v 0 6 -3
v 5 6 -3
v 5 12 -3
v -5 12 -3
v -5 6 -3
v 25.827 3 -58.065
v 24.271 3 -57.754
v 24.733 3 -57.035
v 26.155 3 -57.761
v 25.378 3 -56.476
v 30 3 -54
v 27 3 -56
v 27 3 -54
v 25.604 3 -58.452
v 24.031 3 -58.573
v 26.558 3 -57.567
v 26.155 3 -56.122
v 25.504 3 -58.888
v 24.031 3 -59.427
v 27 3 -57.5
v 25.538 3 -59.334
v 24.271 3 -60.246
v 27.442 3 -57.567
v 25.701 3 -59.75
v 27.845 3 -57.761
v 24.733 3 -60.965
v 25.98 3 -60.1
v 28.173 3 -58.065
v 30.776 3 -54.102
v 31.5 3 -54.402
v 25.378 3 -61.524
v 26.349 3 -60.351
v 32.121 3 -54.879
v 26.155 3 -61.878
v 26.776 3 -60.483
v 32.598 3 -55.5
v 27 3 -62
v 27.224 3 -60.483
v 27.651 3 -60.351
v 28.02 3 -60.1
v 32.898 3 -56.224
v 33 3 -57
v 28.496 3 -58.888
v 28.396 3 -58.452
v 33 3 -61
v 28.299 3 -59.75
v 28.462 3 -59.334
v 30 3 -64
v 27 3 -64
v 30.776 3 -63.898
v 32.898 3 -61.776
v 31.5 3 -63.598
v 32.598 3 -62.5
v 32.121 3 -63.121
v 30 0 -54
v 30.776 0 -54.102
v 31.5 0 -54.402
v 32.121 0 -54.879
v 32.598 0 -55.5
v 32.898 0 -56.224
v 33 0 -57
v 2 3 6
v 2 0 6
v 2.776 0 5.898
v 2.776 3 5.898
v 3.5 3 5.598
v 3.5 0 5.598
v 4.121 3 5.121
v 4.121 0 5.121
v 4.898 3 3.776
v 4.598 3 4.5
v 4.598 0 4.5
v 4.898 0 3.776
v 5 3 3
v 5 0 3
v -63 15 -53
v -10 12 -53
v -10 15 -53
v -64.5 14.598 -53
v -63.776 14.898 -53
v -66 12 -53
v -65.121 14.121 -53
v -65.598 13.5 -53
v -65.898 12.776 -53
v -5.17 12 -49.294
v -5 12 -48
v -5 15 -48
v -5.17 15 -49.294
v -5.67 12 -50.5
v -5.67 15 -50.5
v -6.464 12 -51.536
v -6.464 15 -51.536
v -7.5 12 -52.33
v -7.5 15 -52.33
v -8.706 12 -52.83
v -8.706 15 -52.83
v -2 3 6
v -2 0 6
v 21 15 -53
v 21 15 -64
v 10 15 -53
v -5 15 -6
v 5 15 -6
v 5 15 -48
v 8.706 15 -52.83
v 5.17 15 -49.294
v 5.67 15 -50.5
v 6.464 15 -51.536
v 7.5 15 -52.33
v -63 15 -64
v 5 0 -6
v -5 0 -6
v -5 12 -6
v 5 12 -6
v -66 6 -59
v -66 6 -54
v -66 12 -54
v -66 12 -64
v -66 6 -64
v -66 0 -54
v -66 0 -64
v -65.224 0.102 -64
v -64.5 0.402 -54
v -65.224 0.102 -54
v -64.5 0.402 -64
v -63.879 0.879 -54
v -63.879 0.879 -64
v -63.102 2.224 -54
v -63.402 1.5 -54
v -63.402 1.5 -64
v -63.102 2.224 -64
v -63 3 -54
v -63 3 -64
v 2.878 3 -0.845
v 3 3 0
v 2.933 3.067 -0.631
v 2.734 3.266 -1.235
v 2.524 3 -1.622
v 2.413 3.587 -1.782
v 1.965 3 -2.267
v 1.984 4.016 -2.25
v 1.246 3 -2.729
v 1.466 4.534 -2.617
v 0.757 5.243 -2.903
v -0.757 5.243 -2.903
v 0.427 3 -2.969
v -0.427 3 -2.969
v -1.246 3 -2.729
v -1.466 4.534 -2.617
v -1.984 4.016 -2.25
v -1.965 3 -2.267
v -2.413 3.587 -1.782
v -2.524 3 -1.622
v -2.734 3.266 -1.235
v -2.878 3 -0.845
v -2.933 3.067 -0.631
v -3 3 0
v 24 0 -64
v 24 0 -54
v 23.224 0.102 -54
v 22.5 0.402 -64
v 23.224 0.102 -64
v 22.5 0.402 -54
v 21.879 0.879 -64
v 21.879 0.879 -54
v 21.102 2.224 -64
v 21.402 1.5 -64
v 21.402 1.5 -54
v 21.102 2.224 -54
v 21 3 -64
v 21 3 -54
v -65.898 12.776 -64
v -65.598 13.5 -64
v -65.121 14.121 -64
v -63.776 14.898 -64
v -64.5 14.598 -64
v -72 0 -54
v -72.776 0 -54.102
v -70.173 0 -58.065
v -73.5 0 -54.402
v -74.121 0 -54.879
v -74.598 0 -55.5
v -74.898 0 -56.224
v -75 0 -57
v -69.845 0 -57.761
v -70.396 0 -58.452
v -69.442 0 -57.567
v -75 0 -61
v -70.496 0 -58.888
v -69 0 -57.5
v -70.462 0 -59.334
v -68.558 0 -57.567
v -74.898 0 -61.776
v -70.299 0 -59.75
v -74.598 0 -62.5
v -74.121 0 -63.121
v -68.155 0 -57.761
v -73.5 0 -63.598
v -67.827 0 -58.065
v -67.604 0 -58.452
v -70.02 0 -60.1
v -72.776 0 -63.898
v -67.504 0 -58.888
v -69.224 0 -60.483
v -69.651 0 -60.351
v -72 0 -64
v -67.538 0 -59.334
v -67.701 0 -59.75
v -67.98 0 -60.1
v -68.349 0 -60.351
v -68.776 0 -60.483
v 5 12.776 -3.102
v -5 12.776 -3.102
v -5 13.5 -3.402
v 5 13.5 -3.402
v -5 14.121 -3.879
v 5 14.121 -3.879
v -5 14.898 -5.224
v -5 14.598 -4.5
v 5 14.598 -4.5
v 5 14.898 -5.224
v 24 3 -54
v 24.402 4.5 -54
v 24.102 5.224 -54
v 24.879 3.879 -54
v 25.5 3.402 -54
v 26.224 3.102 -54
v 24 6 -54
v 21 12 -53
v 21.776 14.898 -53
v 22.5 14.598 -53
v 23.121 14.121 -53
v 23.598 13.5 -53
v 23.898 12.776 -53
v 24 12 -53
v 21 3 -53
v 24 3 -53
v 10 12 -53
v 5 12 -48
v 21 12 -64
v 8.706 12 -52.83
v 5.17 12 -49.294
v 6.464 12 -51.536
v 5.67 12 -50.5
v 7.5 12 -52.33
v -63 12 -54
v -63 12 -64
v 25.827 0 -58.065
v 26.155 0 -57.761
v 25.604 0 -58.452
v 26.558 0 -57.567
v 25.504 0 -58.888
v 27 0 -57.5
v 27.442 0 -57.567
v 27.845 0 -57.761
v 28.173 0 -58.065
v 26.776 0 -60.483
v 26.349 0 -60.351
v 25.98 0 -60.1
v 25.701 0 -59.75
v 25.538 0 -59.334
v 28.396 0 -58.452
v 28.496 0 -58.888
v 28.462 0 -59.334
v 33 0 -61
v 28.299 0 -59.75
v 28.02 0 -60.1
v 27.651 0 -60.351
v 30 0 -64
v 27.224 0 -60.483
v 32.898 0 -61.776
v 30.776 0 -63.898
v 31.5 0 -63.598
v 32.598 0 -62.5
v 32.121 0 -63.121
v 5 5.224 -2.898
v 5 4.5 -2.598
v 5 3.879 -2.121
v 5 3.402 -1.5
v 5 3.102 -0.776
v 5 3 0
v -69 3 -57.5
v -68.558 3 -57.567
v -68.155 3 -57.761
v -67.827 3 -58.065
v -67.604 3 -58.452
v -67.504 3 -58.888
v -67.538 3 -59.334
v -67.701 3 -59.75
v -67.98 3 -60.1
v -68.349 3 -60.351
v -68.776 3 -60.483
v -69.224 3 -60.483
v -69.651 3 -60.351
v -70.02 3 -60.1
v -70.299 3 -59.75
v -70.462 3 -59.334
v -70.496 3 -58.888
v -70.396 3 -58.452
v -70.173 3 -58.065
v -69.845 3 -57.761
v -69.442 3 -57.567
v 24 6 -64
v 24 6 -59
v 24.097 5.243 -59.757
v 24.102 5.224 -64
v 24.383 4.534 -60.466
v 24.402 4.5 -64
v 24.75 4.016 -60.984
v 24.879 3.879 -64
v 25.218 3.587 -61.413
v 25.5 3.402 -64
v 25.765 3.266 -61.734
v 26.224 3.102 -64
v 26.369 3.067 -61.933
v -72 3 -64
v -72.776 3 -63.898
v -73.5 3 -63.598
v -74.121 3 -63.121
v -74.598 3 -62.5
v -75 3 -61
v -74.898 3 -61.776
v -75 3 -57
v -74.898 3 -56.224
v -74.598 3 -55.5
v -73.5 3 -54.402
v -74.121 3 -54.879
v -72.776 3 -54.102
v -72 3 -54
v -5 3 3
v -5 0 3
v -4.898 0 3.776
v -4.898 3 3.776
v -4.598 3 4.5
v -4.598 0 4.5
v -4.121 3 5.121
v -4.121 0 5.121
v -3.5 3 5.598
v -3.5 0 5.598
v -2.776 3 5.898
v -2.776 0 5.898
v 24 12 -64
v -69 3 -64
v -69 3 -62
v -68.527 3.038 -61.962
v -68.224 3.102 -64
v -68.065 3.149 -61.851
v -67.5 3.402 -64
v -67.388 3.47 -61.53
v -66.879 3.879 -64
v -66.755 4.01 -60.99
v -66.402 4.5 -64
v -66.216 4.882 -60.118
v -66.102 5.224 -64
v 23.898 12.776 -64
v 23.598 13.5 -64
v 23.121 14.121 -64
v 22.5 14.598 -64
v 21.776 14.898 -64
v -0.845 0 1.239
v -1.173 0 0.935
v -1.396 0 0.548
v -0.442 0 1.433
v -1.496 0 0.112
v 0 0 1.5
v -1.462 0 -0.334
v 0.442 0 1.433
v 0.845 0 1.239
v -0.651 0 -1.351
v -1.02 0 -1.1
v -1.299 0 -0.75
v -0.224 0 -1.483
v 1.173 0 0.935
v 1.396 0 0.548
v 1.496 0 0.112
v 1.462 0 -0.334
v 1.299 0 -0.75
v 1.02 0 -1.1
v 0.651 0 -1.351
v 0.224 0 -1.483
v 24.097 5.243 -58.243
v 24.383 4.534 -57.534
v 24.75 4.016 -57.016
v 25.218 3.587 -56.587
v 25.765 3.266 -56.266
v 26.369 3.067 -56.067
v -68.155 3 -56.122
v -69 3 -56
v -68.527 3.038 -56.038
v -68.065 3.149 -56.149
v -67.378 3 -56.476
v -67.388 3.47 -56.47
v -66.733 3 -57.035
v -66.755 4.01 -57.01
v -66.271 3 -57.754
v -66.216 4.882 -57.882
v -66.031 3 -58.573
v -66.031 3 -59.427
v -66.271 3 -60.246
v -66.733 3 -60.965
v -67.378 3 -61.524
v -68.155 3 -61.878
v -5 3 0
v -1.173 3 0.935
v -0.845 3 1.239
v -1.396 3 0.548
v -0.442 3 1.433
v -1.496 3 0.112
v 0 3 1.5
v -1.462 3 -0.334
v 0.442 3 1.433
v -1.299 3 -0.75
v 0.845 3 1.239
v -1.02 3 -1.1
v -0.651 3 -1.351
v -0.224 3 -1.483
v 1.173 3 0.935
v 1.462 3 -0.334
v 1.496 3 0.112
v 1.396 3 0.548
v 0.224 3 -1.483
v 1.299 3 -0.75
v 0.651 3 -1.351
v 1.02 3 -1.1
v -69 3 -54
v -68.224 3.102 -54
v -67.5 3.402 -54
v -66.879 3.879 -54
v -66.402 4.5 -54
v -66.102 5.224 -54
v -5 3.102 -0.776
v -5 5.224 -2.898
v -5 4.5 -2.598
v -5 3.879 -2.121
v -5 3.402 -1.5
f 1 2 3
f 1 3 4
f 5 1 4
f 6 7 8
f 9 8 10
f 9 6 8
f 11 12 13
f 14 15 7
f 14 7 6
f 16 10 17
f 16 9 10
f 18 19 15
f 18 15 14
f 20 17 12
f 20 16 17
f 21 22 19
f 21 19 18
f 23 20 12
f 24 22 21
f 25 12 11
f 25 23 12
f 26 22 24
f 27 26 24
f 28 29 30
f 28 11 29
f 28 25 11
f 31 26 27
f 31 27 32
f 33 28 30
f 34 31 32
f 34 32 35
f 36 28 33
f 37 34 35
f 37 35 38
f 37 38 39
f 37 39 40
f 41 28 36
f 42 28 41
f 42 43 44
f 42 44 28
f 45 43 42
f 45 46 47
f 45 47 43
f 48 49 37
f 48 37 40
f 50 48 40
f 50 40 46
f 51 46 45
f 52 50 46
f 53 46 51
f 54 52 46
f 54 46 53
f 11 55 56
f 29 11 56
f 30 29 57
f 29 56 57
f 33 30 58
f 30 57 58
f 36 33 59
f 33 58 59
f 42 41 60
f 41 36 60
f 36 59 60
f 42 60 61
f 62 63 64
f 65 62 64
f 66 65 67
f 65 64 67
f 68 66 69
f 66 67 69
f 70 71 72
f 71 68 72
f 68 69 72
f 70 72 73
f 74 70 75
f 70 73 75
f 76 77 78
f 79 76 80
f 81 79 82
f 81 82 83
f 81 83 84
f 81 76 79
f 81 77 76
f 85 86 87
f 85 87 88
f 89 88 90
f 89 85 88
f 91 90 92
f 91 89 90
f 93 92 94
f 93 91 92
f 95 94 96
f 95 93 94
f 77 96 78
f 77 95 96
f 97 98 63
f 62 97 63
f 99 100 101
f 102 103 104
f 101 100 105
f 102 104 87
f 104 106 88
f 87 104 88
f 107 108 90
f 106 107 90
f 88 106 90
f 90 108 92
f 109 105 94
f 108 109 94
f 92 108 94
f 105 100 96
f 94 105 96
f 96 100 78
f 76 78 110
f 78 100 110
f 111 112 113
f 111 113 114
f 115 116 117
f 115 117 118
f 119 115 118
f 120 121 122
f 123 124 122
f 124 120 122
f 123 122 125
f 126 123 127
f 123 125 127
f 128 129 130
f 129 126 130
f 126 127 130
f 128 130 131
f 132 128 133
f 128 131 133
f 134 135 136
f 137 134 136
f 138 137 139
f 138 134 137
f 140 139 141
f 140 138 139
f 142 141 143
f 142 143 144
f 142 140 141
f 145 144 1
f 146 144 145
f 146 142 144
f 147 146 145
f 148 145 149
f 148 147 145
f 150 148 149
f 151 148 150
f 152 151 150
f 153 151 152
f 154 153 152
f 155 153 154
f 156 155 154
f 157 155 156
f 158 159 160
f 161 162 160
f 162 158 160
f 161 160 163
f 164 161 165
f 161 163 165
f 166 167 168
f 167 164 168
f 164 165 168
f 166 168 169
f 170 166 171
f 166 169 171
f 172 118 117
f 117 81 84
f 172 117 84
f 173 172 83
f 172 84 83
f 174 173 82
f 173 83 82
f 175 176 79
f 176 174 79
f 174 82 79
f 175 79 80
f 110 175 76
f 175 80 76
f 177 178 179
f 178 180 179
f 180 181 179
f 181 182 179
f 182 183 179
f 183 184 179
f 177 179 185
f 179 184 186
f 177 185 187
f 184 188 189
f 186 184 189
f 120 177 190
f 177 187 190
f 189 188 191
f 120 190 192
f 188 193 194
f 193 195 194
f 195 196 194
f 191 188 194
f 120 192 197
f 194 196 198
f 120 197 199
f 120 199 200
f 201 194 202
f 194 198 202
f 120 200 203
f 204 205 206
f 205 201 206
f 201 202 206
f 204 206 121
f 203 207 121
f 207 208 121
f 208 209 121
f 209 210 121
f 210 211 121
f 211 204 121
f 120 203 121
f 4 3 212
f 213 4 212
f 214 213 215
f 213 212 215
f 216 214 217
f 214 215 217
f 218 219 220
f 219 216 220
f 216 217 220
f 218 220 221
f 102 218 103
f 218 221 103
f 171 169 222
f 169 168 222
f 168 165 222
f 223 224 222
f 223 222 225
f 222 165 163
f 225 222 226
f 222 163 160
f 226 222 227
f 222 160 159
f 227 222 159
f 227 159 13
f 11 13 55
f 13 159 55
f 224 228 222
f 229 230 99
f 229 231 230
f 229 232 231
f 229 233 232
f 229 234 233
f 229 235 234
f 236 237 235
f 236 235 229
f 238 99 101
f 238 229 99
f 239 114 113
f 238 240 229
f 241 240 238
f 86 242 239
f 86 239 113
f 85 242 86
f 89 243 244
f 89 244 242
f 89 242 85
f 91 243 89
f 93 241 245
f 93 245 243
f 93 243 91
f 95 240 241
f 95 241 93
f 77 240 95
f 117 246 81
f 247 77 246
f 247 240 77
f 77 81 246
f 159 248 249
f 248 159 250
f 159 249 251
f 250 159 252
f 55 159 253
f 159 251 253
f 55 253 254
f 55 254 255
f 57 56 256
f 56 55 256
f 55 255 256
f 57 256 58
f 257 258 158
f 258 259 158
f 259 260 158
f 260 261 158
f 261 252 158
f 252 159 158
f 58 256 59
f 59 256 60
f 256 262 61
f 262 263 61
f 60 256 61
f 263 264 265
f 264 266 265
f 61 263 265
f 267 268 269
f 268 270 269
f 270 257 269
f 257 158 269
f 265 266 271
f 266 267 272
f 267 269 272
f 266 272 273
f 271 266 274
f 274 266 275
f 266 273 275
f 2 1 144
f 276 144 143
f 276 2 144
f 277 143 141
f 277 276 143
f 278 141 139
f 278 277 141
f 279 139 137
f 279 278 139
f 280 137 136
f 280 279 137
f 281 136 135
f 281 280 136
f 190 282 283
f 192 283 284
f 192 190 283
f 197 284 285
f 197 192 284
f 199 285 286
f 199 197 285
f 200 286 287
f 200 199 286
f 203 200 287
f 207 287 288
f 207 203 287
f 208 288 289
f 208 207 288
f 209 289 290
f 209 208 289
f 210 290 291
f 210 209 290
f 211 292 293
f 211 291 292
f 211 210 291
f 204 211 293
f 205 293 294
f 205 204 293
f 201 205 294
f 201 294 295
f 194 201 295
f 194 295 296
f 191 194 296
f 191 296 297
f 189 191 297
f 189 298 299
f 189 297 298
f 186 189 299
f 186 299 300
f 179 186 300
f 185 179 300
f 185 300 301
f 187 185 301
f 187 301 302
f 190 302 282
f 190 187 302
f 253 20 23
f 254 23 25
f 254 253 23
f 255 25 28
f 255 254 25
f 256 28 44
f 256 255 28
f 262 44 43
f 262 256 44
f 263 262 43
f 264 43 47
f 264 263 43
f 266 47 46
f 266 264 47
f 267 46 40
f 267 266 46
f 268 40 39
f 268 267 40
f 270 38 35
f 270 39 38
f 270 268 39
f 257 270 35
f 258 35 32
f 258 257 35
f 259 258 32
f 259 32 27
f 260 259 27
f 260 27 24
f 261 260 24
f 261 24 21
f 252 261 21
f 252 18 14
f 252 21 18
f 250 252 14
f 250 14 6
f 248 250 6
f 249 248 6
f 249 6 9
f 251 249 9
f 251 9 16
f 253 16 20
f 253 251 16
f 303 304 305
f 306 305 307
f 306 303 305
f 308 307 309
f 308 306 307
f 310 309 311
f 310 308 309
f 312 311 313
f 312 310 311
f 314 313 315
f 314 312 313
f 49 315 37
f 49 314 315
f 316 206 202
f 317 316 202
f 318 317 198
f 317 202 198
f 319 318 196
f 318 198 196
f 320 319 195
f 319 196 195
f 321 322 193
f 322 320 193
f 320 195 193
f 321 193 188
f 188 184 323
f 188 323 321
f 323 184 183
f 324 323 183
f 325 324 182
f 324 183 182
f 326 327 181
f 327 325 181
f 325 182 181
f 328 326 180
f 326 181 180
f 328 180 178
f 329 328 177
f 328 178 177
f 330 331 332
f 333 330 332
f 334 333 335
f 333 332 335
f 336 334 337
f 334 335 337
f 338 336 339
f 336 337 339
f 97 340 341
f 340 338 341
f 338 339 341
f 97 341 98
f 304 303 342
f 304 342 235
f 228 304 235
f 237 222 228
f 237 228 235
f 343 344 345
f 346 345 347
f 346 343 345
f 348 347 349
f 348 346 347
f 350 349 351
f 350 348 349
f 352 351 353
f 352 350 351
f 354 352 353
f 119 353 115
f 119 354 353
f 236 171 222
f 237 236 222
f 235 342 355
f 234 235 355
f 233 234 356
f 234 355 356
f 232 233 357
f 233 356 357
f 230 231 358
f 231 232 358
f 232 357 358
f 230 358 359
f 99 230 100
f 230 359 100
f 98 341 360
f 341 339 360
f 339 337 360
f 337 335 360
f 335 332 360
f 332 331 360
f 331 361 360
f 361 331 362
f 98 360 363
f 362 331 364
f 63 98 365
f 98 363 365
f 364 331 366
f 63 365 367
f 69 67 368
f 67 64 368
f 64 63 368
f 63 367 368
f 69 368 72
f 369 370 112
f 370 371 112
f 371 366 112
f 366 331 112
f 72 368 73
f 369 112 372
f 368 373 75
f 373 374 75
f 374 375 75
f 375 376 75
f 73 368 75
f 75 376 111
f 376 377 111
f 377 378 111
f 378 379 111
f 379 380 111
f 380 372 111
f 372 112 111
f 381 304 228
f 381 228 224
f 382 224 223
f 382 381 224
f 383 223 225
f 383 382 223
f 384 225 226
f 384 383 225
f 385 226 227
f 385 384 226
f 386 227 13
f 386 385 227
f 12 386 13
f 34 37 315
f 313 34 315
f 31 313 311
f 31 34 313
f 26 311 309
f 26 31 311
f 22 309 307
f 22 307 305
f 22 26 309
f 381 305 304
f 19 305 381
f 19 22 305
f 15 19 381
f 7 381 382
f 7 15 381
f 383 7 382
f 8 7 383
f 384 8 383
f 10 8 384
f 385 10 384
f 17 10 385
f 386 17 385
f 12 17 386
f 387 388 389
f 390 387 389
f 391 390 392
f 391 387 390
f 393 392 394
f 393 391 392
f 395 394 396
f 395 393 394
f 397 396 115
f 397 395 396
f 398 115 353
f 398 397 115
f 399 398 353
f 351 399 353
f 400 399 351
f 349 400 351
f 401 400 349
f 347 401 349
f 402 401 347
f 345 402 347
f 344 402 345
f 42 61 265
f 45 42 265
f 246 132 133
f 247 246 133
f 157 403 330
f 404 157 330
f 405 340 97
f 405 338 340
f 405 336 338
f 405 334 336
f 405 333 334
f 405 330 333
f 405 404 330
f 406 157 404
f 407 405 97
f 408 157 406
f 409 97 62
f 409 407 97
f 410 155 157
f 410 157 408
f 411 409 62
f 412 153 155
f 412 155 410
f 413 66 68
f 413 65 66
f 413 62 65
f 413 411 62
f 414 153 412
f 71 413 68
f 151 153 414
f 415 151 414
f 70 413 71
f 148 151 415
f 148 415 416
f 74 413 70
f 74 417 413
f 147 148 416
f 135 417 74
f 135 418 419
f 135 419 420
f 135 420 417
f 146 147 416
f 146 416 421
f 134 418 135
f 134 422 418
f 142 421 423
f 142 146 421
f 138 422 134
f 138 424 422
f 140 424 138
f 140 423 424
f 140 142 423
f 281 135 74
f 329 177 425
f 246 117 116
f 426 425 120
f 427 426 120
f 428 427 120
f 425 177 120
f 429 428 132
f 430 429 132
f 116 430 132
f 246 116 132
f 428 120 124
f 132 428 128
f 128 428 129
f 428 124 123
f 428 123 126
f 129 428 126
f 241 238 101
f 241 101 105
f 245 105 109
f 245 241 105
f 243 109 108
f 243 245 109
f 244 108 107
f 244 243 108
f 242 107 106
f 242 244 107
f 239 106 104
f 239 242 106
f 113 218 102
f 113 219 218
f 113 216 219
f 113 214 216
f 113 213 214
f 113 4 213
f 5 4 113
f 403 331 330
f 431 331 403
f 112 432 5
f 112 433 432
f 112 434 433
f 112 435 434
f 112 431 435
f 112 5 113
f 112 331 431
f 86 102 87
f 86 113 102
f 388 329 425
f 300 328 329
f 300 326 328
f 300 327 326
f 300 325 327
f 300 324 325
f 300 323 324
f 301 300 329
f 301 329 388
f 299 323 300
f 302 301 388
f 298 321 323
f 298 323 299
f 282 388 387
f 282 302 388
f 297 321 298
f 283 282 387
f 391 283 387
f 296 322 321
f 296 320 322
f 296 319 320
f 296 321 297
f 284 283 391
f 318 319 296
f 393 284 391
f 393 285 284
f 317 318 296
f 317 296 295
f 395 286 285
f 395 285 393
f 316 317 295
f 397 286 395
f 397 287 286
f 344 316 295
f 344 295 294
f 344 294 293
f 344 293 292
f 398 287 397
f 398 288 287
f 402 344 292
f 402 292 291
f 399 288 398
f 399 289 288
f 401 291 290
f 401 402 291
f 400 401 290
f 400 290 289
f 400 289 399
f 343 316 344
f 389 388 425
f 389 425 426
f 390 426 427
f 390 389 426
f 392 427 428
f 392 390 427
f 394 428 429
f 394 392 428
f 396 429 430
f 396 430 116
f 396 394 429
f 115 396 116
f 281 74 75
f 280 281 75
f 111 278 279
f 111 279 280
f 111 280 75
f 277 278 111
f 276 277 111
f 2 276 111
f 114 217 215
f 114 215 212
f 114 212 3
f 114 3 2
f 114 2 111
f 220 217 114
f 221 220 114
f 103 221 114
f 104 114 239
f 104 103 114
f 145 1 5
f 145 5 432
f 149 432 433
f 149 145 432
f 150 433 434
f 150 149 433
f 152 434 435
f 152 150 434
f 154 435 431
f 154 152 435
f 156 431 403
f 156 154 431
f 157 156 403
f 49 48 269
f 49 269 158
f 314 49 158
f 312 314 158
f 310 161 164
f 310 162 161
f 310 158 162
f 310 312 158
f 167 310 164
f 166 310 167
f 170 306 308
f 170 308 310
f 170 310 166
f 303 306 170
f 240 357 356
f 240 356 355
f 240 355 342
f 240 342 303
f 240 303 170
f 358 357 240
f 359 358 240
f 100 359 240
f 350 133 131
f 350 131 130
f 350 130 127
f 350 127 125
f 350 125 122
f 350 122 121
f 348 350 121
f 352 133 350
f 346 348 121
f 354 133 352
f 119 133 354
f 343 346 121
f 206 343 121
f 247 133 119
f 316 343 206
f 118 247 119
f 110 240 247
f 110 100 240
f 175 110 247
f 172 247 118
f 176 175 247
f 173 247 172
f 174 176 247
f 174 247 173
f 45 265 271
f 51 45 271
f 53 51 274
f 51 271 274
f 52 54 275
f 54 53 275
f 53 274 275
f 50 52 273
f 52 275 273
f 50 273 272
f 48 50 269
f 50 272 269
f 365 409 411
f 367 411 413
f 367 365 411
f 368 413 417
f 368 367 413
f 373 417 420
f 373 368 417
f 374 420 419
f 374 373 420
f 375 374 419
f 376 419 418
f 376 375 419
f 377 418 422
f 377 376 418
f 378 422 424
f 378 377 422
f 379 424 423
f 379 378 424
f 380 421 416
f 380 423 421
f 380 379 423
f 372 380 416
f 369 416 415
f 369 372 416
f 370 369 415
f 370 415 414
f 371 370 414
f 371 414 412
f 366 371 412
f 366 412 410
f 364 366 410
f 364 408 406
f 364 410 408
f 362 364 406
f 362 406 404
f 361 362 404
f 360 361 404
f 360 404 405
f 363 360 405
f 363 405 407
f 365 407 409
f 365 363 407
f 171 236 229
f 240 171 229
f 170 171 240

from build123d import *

# Parameters (mm, degrees)
SKETCH1_W               = 12
SKETCH1_H               = 10
SKETCH1_R               = 1.5
SCREW_TABS_DEPTH        = 3
SCREW_TABS_2_DEPTH      = 3
SKETCH1_W_2             = 10
SKETCH1_H_2             = 12
SCREW_TABS_3_DEPTH      = 3
SKETCH2_W               = 3
SKETCH2_H               = 10
SKETCH2_H_2             = 11
SKETCH2_W_2             = 10
SKETCH2_H_3             = 3
VERTICAL_EXTRUDE_DEPTH  = 9
TOP_BRACKET_DEPTH       = 3
F_3MM_EDGE_ROUNDING_R   = 3
SKETCH4_R               = 3
SCREWHOLE_CLEARUP_DEPTH = 100.322706431


with BuildPart() as part:
    # Sketch1 → Screw tabs (new body)
    with BuildSketch(Plane(origin=(0, 0, 0), x_dir=(1, 0, 0), z_dir=(0, 1, 0))):
        with Locations((-69, 59)):
            Rectangle(SKETCH1_W, SKETCH1_H)
        with Locations(Location((-69, 59, 0), (0, 0, 270))):
            Circle(SKETCH1_R, mode=Mode.SUBTRACT)
    extrude(amount=SCREW_TABS_DEPTH)



with BuildPart() as body_2:
    # Sketch1 → Screw tabs 2 (new body)
    with BuildSketch(Plane(origin=(0, 0, 0), x_dir=(1, 0, 0), z_dir=(0, 1, 0))):
        with Locations((27, 59)):
            Rectangle(SKETCH1_W, SKETCH1_H)
        with Locations(Location((27, 59, 0), (0, 0, 270))):
            Circle(SKETCH1_R, mode=Mode.SUBTRACT)
    extrude(amount=SCREW_TABS_2_DEPTH)


with BuildPart() as body_3:
    # Sketch1 → Screw tabs 3 (new body)
    with BuildSketch(Plane(origin=(0, 0, 0), x_dir=(1, 0, 0), z_dir=(0, 1, 0))):
        Rectangle(SKETCH1_W_2, SKETCH1_H_2)
        with Locations(Location((0, 0, 0), (0, 0, 270))):
            Circle(SKETCH1_R, mode=Mode.SUBTRACT)
    extrude(amount=SCREW_TABS_3_DEPTH)


with BuildPart() as part_1:
    add(part.part)

    add(body_2.part)  # Vertical extrude merges body 2

    add(body_3.part)  # Vertical extrude merges body 3
    # Sketch2 → Vertical extrude (add)
    with BuildSketch(Plane(origin=(0, 3, 0), x_dir=(1, 0, 0), z_dir=(0, 1, 0))):
        with Locations((-64.5, 59)):
            Rectangle(SKETCH2_W, SKETCH2_H)
        with Locations((22.5, 58.5)):
            Rectangle(SKETCH2_W, SKETCH2_H_2)
        with Locations((0, 4.5)):
            Rectangle(SKETCH2_W_2, SKETCH2_H_3)
    extrude(amount=VERTICAL_EXTRUDE_DEPTH)

    # Sketch3 → Top bracket (add)
    with BuildSketch(Plane(origin=(0, 12, 0), x_dir=(1, 0, 0), z_dir=(0, 1, 0))):
        with BuildLine():
            Line((-66, 64), (24, 64))
            Line((24, 64), (24, 53))
            Line((24, 53), (10, 53))
            ThreePointArc((10, 53), (6.464466094, 51.535533906), (5, 48))
            Line((5, 48), (5, 3))
            Line((5, 3), (-5, 3))
            Line((-5, 3), (-5, 48))
            ThreePointArc((-5, 48), (-6.464466094, 51.535533906), (-10, 53))
            Line((-10, 53), (-66, 53))
            Line((-66, 53), (-66, 64))
        make_face()
    extrude(amount=TOP_BRACKET_DEPTH)

    # 3mm edge rounding
    # the kernel refuses this fillet: 3 mm, written as the material it adds along each edge
    with BuildSketch(Plane(origin=(24, 3, -64), x_dir=(1, 0, 0), z_dir=(0, 0, 1))) as f_3mm_edge_rounding_piece_1_section:
        with BuildLine():
            CenterArc((F_3MM_EDGE_ROUNDING_R, F_3MM_EDGE_ROUNDING_R), F_3MM_EDGE_ROUNDING_R, 180, 90)
            Line((0, F_3MM_EDGE_ROUNDING_R), (0, 0))
            Line((0, 0), (F_3MM_EDGE_ROUNDING_R, 0))
        make_face()
    f_3mm_edge_rounding_piece_1 = extrude(amount=10, mode=Mode.PRIVATE)
    f_3mm_edge_rounding_piece_1 = f_3mm_edge_rounding_piece_1 - Plane(origin=(27, 3.680423694, -59), x_dir=(0, 0, 1), z_dir=(0, -1, 0)) * Cylinder(1.5, 33, mode=Mode.PRIVATE)
    add(f_3mm_edge_rounding_piece_1)
    with BuildSketch(Plane(origin=(5, 3, -3), x_dir=(0, 0, 1), z_dir=(-1, 0, 0))) as f_3mm_edge_rounding_piece_2_section:
        with BuildLine():
            CenterArc((F_3MM_EDGE_ROUNDING_R, F_3MM_EDGE_ROUNDING_R), F_3MM_EDGE_ROUNDING_R, 180, 90)
            Line((0, F_3MM_EDGE_ROUNDING_R), (0, 0))
            Line((0, 0), (F_3MM_EDGE_ROUNDING_R, 0))
        make_face()
    f_3mm_edge_rounding_piece_2 = extrude(amount=10, mode=Mode.PRIVATE)
    f_3mm_edge_rounding_piece_2 = f_3mm_edge_rounding_piece_2 - Plane(origin=(0, 3.680423694, 0), x_dir=(0, 0, 1), z_dir=(0, -1, 0)) * Cylinder(1.5, 32, mode=Mode.PRIVATE)
    add(f_3mm_edge_rounding_piece_2)
    with BuildSketch(Plane(origin=(-66, 3, -64), x_dir=(0, 1, 0), z_dir=(0, 0, 1))) as f_3mm_edge_rounding_piece_3_section:
        with BuildLine():
            CenterArc((F_3MM_EDGE_ROUNDING_R, F_3MM_EDGE_ROUNDING_R), F_3MM_EDGE_ROUNDING_R, 180, 90)
            Line((0, F_3MM_EDGE_ROUNDING_R), (0, 0))
            Line((0, 0), (F_3MM_EDGE_ROUNDING_R, 0))
        make_face()
    f_3mm_edge_rounding_piece_3 = extrude(amount=10, mode=Mode.PRIVATE)
    f_3mm_edge_rounding_piece_3 = f_3mm_edge_rounding_piece_3 - Plane(origin=(-69, 3.680423205, -59), x_dir=(0, 0, 1), z_dir=(0, -1, 0)) * Cylinder(1.5, 32, mode=Mode.PRIVATE)
    add(f_3mm_edge_rounding_piece_3)
    # the kernel refuses this fillet: 3 mm, written as the material it takes off along each edge
    with BuildSketch(Plane(origin=(-63, 0, -71.5), x_dir=(0, 1, 0), z_dir=(0, 0, 1)), Plane(origin=(21, 0, -46.5), x_dir=(0, 1, 0), z_dir=(0, 0, -1))) as f_3mm_edge_rounding_2_piece_1:
        with BuildLine():
            CenterArc((F_3MM_EDGE_ROUNDING_R, F_3MM_EDGE_ROUNDING_R), F_3MM_EDGE_ROUNDING_R, 180, 90)
            Line((0, F_3MM_EDGE_ROUNDING_R), (0, 0))
            Line((0, 0), (F_3MM_EDGE_ROUNDING_R, 0))
        make_face()
    extrude(amount=25, mode=Mode.SUBTRACT)
    with BuildSketch(Plane(origin=(33, -7.5, -64), x_dir=(-1, 0, 0), z_dir=(0, 1, 0)), Plane(origin=(5, -7.5, 6), x_dir=(0, 0, -1), z_dir=(0, 1, 0)), Plane(origin=(-75, -7.5, -54), x_dir=(1, 0, 0), z_dir=(0, 1, 0))) as f_3mm_edge_rounding_2_piece_2:
        with BuildLine():
            CenterArc((F_3MM_EDGE_ROUNDING_R, F_3MM_EDGE_ROUNDING_R), F_3MM_EDGE_ROUNDING_R, 180, 90)
            Line((0, F_3MM_EDGE_ROUNDING_R), (0, 0))
            Line((0, 0), (F_3MM_EDGE_ROUNDING_R, 0))
        make_face()
    extrude(amount=18, mode=Mode.SUBTRACT)
    with BuildSketch(Plane(origin=(33, -7.5, -54), x_dir=(-1, 0, 0), z_dir=(0, 1, 0)), Plane(origin=(-5, -7.5, 6), x_dir=(0, 0, -1), z_dir=(0, 1, 0)), Plane(origin=(-75, -7.5, -64), x_dir=(1, 0, 0), z_dir=(0, 1, 0))) as f_3mm_edge_rounding_2_piece_3:
        with BuildLine():
            CenterArc((F_3MM_EDGE_ROUNDING_R, -F_3MM_EDGE_ROUNDING_R), F_3MM_EDGE_ROUNDING_R, 90, 90)
            Line((0, -F_3MM_EDGE_ROUNDING_R), (0, 0))
            Line((0, 0), (F_3MM_EDGE_ROUNDING_R, 0))
        make_face()
    extrude(amount=18, mode=Mode.SUBTRACT)
    with BuildSketch(Plane(origin=(24, 15, -71.5), x_dir=(-1, 0, 0), z_dir=(0, 0, 1)), Plane(origin=(-66, 15, -45.5), x_dir=(1, 0, 0), z_dir=(0, 0, -1))) as f_3mm_edge_rounding_2_piece_4:
        with BuildLine():
            CenterArc((F_3MM_EDGE_ROUNDING_R, F_3MM_EDGE_ROUNDING_R), F_3MM_EDGE_ROUNDING_R, 180, 90)
            Line((0, F_3MM_EDGE_ROUNDING_R), (0, 0))
            Line((0, 0), (F_3MM_EDGE_ROUNDING_R, 0))
        make_face()
    extrude(amount=26, mode=Mode.SUBTRACT)
    with BuildSketch(Plane(origin=(12.5, 15, -3), x_dir=(0, -1, 0), z_dir=(-1, 0, 0))) as f_3mm_edge_rounding_2_piece_5:
        with BuildLine():
            CenterArc((F_3MM_EDGE_ROUNDING_R, -F_3MM_EDGE_ROUNDING_R), F_3MM_EDGE_ROUNDING_R, 90, 90)
            Line((0, -F_3MM_EDGE_ROUNDING_R), (0, 0))
            Line((0, 0), (F_3MM_EDGE_ROUNDING_R, 0))
        make_face()
    extrude(amount=25, mode=Mode.SUBTRACT)

    # Sketch4 → Screwhole clearup (cut, through all)
    with BuildSketch(Plane(origin=(0, 3, 0), x_dir=(1, 0, 0), z_dir=(0, 1, 0))):
        with Locations((-69, 59)):
            Circle(SKETCH4_R)
        Circle(SKETCH4_R)
        with Locations((27, 59)):
            Circle(SKETCH4_R)
    extrude(amount=SCREWHOLE_CLEARUP_DEPTH, mode=Mode.SUBTRACT)


solid = part_1.part
